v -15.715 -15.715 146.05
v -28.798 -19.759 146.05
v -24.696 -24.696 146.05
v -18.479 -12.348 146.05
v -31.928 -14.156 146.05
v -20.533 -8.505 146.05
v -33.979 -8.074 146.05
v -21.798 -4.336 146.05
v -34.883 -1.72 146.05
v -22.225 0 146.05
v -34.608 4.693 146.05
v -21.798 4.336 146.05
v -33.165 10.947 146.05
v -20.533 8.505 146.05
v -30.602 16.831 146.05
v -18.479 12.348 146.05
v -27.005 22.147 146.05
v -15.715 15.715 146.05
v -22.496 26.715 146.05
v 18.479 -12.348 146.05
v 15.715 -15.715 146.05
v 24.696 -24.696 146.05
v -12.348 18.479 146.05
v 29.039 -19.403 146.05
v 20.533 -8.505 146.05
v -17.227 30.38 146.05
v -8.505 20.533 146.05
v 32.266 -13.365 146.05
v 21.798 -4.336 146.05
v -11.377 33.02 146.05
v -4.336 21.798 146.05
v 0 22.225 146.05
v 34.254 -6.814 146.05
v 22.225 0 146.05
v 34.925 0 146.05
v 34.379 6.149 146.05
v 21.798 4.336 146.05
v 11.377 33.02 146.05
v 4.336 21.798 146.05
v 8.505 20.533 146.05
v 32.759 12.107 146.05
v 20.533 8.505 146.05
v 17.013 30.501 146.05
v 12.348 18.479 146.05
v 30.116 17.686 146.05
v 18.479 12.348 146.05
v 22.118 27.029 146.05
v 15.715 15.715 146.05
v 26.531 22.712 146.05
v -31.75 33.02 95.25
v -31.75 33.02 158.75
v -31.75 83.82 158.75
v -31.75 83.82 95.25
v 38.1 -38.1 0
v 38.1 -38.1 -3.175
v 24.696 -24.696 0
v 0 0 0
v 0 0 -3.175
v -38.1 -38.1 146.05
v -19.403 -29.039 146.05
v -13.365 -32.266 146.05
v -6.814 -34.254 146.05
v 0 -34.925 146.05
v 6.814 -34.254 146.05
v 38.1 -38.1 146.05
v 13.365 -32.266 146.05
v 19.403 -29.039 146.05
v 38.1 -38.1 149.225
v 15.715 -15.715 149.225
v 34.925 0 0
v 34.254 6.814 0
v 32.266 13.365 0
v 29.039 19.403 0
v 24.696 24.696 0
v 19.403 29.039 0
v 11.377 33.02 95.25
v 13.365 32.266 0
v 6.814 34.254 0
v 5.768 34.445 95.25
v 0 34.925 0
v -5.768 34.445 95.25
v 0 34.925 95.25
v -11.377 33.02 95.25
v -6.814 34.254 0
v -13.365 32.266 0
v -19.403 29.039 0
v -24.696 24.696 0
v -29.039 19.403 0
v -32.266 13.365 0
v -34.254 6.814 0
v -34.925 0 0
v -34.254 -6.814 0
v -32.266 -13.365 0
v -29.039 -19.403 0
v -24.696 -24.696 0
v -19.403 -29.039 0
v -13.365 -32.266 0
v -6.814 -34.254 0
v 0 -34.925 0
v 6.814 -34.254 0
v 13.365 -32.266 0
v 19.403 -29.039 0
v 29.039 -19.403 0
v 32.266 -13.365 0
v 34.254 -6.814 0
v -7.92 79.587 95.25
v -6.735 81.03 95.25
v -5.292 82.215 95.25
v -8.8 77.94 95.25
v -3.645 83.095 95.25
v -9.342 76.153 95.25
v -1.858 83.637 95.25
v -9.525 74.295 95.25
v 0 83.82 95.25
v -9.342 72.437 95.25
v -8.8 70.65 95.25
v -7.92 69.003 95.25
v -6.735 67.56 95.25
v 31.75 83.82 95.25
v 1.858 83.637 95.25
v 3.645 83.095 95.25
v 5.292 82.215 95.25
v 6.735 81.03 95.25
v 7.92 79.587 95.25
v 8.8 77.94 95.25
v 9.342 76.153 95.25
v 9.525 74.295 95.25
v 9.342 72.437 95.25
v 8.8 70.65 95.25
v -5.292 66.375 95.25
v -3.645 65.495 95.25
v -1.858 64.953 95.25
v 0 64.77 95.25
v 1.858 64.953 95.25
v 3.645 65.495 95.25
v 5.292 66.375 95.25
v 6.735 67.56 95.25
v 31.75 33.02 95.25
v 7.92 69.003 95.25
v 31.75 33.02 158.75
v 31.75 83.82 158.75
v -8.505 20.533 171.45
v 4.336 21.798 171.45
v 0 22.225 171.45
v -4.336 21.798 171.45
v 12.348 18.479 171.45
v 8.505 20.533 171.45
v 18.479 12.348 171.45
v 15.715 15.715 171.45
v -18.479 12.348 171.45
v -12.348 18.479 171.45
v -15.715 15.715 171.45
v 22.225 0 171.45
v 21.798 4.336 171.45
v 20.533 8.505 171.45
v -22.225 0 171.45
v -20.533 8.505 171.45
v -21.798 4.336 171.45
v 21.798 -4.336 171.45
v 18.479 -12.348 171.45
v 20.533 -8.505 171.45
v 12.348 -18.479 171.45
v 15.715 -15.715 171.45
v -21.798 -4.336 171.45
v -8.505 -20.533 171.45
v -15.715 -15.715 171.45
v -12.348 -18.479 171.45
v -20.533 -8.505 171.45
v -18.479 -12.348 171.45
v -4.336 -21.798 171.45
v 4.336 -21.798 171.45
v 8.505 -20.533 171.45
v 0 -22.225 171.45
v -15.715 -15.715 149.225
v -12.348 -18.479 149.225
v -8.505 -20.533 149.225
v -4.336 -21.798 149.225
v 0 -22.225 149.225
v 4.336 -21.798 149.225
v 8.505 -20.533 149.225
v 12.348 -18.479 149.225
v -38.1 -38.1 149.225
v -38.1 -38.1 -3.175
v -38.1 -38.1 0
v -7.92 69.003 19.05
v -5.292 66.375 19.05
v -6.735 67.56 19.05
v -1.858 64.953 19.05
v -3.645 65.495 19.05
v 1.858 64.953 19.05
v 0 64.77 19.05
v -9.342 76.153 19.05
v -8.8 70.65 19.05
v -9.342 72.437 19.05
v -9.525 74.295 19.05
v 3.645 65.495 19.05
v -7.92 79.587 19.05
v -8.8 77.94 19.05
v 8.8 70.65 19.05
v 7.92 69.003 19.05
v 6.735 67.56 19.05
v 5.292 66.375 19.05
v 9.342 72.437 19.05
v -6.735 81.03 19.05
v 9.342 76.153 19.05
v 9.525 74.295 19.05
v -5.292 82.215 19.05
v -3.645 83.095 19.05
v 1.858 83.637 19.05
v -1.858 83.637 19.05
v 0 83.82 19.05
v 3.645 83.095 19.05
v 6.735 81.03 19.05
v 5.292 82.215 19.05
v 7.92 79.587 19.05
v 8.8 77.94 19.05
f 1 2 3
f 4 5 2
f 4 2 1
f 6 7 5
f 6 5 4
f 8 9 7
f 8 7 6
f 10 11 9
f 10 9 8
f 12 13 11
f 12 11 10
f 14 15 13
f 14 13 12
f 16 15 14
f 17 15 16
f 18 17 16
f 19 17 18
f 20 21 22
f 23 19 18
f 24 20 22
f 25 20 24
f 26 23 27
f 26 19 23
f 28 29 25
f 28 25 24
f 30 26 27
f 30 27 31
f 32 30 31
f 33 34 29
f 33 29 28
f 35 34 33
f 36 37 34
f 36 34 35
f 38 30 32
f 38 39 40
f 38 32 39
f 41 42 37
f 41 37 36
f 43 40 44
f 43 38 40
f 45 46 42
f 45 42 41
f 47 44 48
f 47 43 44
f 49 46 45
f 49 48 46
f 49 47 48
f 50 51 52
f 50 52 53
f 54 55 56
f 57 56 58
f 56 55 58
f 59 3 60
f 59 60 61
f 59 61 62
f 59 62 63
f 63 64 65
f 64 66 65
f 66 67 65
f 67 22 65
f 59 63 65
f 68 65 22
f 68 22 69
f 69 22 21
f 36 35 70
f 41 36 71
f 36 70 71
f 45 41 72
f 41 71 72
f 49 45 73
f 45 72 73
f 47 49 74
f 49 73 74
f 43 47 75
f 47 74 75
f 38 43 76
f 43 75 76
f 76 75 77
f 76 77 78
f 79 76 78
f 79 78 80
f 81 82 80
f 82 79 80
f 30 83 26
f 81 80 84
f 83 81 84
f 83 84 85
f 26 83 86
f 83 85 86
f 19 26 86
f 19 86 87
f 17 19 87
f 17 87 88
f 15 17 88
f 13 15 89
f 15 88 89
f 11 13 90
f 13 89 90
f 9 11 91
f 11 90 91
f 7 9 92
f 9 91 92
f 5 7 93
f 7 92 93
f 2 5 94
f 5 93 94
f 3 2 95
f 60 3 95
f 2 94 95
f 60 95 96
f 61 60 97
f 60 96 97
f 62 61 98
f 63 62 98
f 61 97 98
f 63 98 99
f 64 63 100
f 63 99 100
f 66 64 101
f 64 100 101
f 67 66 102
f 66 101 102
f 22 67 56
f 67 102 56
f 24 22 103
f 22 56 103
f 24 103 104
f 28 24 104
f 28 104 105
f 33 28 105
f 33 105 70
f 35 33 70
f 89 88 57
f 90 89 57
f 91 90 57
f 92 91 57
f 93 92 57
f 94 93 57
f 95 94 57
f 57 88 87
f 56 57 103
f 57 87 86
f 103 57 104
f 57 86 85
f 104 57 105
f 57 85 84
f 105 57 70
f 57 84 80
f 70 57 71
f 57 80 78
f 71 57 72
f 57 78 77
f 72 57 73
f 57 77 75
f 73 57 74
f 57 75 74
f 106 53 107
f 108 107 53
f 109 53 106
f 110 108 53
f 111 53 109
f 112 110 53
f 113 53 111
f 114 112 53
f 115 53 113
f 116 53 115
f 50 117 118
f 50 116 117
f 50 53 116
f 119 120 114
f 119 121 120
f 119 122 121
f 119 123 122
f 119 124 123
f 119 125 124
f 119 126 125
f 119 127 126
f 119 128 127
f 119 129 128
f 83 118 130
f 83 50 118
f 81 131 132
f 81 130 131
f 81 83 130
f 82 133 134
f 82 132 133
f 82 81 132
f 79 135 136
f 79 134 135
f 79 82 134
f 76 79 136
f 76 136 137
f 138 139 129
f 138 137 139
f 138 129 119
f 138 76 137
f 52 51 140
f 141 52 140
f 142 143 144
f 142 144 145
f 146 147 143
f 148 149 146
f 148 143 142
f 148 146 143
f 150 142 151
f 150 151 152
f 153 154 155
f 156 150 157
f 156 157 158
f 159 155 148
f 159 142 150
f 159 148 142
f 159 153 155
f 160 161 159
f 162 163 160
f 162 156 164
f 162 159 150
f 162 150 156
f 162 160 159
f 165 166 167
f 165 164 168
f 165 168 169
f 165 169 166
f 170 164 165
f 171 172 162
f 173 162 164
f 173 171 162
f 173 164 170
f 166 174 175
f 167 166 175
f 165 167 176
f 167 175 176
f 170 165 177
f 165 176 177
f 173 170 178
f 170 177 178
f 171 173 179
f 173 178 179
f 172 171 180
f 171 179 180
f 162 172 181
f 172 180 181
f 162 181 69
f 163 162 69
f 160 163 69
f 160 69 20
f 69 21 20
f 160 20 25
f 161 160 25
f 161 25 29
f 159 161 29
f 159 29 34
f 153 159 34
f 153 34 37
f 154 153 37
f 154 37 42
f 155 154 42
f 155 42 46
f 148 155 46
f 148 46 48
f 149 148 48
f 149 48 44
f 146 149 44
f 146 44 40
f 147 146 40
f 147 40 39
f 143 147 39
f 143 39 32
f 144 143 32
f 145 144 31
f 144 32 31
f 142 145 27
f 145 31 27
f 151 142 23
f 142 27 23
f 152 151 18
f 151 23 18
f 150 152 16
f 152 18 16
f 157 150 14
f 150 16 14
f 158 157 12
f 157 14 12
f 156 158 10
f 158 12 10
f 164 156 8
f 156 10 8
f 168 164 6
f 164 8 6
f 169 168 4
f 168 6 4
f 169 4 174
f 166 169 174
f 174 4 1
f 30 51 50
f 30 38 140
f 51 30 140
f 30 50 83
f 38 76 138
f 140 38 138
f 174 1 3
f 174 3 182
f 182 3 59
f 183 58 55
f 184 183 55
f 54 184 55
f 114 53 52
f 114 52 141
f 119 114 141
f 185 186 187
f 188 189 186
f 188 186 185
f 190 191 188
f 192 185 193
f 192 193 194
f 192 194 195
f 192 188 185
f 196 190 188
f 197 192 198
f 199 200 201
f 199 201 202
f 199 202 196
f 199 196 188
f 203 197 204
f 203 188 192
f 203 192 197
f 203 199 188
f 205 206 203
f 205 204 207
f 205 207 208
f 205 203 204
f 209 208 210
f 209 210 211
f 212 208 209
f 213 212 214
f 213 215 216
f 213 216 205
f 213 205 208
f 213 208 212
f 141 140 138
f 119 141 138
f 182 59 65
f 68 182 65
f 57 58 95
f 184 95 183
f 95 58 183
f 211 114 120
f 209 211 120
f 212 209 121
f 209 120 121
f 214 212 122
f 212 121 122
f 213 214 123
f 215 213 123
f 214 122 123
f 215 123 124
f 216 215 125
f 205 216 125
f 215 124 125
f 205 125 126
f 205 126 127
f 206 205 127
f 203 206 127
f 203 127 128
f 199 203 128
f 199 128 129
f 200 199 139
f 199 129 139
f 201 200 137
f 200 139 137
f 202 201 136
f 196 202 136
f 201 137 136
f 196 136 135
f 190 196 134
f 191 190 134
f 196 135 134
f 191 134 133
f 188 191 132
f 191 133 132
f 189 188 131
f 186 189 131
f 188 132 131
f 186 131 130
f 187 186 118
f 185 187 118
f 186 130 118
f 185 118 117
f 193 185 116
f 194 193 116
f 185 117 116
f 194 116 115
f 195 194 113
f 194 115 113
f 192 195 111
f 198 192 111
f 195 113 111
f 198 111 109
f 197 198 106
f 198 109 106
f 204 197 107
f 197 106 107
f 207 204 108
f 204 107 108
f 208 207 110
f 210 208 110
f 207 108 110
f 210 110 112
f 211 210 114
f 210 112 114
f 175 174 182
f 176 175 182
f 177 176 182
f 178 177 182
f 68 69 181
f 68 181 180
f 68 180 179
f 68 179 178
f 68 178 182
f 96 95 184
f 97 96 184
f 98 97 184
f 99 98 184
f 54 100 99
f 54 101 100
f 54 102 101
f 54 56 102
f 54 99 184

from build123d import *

# Parameters (mm, degrees)
SKETCH1_R           = 34.925
BOSS_EXTRUDE1_DEPTH = 146.05
BOSS_EXTRUDE2_DEPTH = 3.175
LPATTERN1_COUNT     = 2
LPATTERN1_PITCH     = 149.225
SKETCH4_R           = 22.225
BOSS_EXTRUDE3_DEPTH = 25.4
SKETCH5_W           = 63.5
SKETCH5_H           = 63.5
BOSS_EXTRUDE4_DEPTH = 50.8
SKETCH6_R           = 9.525
BOSS_EXTRUDE5_DEPTH = 76.2


with BuildPart() as part:
    # Sketch1 → Boss-Extrude1 (new body)
    with BuildSketch(Plane.XY):
        Circle(SKETCH1_R)
    extrude(amount=BOSS_EXTRUDE1_DEPTH)

    # Sketch2 → Boss-Extrude2 (add)
    with BuildSketch(Plane.XY.offset(146.05)):
        Polygon((0, 0), (-38.1, -38.1), (38.1, -38.1), align=None)
    boss_extrude2 = extrude(amount=BOSS_EXTRUDE2_DEPTH)

    # LPattern1: Boss-Extrude2 ×2
    with Locations(*[(0, 0, -i * LPATTERN1_PITCH) for i in range(1, LPATTERN1_COUNT)]):
        add(boss_extrude2)

    # Sketch4 → Boss-Extrude3 (add)
    with BuildSketch(Plane.XY.offset(146.05)):
        with Locations(Location((0, 0, 0), (0, 0, 225))):
            Circle(SKETCH4_R)
    extrude(amount=BOSS_EXTRUDE3_DEPTH)

    # Sketch5 → Boss-Extrude4 (add)
    with BuildSketch(Plane(origin=(0, 33.02, 0), x_dir=(1, 0, 0), z_dir=(0, 1, 0))):
        with Locations((0, -127)):
            Rectangle(SKETCH5_W, SKETCH5_H)
    extrude(amount=BOSS_EXTRUDE4_DEPTH)

    # Sketch6 → Boss-Extrude5 (add)
    with BuildSketch(Plane(origin=(0, 0, 95.25), x_dir=(-1, 0, 0), z_dir=(0, 0, -1))):
        with Locations(Location((0, 74.295, 0), (0, 0, 90))):
            Circle(SKETCH6_R)
    extrude(amount=BOSS_EXTRUDE5_DEPTH)


solid = part.part
